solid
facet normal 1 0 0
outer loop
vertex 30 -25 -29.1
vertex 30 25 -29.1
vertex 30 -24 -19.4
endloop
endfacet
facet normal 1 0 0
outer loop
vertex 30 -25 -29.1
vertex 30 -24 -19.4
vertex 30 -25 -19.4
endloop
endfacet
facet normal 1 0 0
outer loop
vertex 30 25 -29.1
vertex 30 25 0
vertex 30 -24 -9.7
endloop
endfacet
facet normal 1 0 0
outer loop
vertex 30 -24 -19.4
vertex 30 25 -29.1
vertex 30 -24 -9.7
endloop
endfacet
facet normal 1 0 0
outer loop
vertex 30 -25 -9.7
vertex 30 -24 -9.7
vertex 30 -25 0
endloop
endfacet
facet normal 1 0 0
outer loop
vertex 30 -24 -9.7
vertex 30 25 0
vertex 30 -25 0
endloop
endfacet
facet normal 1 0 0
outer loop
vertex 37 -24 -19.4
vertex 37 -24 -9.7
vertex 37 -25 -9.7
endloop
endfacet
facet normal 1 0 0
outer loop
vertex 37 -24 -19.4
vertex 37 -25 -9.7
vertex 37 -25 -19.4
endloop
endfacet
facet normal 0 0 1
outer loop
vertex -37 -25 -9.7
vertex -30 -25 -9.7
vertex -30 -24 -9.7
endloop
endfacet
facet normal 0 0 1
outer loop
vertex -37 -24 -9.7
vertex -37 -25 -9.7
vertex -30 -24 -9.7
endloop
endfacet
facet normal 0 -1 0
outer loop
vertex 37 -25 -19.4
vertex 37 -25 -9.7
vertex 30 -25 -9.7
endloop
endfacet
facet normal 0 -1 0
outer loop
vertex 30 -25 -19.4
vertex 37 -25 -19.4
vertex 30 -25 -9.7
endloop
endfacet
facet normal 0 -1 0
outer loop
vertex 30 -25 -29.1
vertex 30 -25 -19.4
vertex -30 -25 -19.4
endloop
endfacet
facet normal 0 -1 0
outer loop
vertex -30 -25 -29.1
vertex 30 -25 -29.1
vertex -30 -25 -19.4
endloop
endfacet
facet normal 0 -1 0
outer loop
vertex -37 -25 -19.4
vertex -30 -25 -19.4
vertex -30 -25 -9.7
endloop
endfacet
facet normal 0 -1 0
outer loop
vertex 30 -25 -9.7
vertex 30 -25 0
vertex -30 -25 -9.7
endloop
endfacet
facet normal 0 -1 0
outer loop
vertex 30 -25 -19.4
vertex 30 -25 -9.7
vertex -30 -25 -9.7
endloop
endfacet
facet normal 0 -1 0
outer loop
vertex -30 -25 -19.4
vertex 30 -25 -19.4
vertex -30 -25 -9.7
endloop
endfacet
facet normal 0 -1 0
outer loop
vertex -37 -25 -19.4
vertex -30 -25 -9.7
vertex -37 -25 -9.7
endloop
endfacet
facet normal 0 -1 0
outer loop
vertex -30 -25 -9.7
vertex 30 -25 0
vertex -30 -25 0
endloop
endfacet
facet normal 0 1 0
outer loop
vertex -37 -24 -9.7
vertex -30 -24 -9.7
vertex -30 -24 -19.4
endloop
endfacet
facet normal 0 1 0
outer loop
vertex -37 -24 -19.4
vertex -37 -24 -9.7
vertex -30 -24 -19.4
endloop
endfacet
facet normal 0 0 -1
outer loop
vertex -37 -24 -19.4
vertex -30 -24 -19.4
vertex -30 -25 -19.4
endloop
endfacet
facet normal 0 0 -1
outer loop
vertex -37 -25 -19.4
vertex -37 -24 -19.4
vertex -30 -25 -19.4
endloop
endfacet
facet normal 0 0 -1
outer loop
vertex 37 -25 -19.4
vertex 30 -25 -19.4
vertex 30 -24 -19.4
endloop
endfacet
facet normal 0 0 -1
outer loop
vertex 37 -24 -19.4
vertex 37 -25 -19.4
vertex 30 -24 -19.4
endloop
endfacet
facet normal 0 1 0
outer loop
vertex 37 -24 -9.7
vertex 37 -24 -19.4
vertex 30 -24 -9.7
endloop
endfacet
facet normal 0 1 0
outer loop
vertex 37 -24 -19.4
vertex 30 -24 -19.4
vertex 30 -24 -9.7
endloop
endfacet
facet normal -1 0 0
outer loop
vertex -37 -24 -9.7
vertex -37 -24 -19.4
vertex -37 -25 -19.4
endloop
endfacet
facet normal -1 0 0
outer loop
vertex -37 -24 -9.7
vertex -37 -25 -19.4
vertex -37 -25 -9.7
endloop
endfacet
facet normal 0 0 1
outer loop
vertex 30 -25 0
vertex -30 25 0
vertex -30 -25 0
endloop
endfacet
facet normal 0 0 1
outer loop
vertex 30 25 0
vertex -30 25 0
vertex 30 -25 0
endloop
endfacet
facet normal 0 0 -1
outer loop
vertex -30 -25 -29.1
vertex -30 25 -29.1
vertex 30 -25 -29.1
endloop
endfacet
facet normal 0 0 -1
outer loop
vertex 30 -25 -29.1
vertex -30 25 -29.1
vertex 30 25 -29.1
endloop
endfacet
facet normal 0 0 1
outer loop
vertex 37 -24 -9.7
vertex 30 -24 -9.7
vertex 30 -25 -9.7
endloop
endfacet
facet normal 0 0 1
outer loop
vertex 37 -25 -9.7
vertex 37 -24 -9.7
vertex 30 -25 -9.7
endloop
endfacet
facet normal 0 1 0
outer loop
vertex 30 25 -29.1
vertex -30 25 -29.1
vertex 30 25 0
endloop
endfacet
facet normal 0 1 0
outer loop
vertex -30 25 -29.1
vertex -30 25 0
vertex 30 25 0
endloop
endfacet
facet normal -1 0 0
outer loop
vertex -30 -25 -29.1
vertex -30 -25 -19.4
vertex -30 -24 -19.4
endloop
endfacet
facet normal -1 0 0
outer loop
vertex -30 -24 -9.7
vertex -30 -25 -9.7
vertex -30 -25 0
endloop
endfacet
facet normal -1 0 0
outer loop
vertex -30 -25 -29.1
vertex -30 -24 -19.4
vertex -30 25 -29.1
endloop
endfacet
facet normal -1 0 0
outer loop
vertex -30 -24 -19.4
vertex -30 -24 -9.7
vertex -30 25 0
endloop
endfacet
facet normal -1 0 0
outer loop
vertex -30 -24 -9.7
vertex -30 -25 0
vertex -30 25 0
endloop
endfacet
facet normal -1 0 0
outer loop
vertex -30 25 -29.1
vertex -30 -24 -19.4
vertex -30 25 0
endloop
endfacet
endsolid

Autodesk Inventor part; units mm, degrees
ref_plane "YZ Plane" through (0, 0, 0) normal (1, 0, 0) x (0, 1, 0)
ref_plane "XZ Plane" through (0, 0, 0) normal (0, 1, 0) x (-1, 0, 0)
ref_plane "XY Plane" through (0, 0, 0) normal (0, 0, 1) x (1, 0, 0)
sketch "Skizze1" plane through (0, 0, 0) normal (0, 0, 1) x (1, 0, 0)
  line L0 (30, -25) -> (-30, -25)
  line L1 (-30, -25) -> (-30, 25)
  line L2 (-30, 25) -> (30, 25)
  line L3 (30, 25) -> (30, -25)
  point P0 (0, 0)
  point P1 (-30, 0)
  point P2 (0, 25)
  dimension "d0" = 50
  dimension "d1" = 60
extrude "Extrusion1" add sketch "Skizze1" against normal blind 29.1
sketch "Skizze4" plane through (30, -25, 0) normal (1, 0, 0) x (0, 0, -1)
  line L0 (0, 0) -> (0, 50) projected
  line L1 (0, 0) -> (29.1, 0) projected
  line L2 (29.1, 0) -> (19.4, 0)
  line L3 (9.7, 0) -> (19.4, 0)
  line L4 (19.4, 0) -> (19.4, 1)
  line L5 (19.4, 1) -> (9.7, 1)
  line L6 (9.7, 1) -> (9.7, 0)
  point P0 (0, 25)
extrude "Extrusion3" add sketch "Skizze4" along normal blind 7
mirror "Spiegeln1" about plane through (0, 0, 0) normal (1, 0, 0) of "Extrusion3"
sketch "Skizze5" plane through (30, -24, -9.7) normal (0, 1, 0) x (1, 0, 0)
  line L0 (7, 0) -> (7, 9.7) projected
  line L1 (0, -9.7) -> (0, 19.4) projected
  line L2 (0, -9.7) -> (0, 0) projected
  line L3 (-60, 9.7) -> (-60, 0) projected
  line L4 (-60, 9.7) -> (-67, 9.7) projected
  line L5 (-67, 9.7) -> (-67, 0) projected
  point P0 (-30, -9.7)
  point P1 (3.5, 4.7412)
  point P2 (-63.5, 4.85)
sketch "Skizze6" plane through (-30, 25, 0) normal (0, 1, 0) x (1, 0, 0)
  line L0 (22.3981, 26.7886) -> (69.5939, 26.7886) construction
  line L1 (69.5939, 26.7886) -> (69.5939, 22.4356) construction
  line L2 (69.5939, 22.4356) -> (22.3981, 22.4356) construction
  line L3 (22.3981, 22.4356) -> (22.3981, 26.7886) construction
  point P0 (30, 0)
properties part number "Akku1" material "Gold"
